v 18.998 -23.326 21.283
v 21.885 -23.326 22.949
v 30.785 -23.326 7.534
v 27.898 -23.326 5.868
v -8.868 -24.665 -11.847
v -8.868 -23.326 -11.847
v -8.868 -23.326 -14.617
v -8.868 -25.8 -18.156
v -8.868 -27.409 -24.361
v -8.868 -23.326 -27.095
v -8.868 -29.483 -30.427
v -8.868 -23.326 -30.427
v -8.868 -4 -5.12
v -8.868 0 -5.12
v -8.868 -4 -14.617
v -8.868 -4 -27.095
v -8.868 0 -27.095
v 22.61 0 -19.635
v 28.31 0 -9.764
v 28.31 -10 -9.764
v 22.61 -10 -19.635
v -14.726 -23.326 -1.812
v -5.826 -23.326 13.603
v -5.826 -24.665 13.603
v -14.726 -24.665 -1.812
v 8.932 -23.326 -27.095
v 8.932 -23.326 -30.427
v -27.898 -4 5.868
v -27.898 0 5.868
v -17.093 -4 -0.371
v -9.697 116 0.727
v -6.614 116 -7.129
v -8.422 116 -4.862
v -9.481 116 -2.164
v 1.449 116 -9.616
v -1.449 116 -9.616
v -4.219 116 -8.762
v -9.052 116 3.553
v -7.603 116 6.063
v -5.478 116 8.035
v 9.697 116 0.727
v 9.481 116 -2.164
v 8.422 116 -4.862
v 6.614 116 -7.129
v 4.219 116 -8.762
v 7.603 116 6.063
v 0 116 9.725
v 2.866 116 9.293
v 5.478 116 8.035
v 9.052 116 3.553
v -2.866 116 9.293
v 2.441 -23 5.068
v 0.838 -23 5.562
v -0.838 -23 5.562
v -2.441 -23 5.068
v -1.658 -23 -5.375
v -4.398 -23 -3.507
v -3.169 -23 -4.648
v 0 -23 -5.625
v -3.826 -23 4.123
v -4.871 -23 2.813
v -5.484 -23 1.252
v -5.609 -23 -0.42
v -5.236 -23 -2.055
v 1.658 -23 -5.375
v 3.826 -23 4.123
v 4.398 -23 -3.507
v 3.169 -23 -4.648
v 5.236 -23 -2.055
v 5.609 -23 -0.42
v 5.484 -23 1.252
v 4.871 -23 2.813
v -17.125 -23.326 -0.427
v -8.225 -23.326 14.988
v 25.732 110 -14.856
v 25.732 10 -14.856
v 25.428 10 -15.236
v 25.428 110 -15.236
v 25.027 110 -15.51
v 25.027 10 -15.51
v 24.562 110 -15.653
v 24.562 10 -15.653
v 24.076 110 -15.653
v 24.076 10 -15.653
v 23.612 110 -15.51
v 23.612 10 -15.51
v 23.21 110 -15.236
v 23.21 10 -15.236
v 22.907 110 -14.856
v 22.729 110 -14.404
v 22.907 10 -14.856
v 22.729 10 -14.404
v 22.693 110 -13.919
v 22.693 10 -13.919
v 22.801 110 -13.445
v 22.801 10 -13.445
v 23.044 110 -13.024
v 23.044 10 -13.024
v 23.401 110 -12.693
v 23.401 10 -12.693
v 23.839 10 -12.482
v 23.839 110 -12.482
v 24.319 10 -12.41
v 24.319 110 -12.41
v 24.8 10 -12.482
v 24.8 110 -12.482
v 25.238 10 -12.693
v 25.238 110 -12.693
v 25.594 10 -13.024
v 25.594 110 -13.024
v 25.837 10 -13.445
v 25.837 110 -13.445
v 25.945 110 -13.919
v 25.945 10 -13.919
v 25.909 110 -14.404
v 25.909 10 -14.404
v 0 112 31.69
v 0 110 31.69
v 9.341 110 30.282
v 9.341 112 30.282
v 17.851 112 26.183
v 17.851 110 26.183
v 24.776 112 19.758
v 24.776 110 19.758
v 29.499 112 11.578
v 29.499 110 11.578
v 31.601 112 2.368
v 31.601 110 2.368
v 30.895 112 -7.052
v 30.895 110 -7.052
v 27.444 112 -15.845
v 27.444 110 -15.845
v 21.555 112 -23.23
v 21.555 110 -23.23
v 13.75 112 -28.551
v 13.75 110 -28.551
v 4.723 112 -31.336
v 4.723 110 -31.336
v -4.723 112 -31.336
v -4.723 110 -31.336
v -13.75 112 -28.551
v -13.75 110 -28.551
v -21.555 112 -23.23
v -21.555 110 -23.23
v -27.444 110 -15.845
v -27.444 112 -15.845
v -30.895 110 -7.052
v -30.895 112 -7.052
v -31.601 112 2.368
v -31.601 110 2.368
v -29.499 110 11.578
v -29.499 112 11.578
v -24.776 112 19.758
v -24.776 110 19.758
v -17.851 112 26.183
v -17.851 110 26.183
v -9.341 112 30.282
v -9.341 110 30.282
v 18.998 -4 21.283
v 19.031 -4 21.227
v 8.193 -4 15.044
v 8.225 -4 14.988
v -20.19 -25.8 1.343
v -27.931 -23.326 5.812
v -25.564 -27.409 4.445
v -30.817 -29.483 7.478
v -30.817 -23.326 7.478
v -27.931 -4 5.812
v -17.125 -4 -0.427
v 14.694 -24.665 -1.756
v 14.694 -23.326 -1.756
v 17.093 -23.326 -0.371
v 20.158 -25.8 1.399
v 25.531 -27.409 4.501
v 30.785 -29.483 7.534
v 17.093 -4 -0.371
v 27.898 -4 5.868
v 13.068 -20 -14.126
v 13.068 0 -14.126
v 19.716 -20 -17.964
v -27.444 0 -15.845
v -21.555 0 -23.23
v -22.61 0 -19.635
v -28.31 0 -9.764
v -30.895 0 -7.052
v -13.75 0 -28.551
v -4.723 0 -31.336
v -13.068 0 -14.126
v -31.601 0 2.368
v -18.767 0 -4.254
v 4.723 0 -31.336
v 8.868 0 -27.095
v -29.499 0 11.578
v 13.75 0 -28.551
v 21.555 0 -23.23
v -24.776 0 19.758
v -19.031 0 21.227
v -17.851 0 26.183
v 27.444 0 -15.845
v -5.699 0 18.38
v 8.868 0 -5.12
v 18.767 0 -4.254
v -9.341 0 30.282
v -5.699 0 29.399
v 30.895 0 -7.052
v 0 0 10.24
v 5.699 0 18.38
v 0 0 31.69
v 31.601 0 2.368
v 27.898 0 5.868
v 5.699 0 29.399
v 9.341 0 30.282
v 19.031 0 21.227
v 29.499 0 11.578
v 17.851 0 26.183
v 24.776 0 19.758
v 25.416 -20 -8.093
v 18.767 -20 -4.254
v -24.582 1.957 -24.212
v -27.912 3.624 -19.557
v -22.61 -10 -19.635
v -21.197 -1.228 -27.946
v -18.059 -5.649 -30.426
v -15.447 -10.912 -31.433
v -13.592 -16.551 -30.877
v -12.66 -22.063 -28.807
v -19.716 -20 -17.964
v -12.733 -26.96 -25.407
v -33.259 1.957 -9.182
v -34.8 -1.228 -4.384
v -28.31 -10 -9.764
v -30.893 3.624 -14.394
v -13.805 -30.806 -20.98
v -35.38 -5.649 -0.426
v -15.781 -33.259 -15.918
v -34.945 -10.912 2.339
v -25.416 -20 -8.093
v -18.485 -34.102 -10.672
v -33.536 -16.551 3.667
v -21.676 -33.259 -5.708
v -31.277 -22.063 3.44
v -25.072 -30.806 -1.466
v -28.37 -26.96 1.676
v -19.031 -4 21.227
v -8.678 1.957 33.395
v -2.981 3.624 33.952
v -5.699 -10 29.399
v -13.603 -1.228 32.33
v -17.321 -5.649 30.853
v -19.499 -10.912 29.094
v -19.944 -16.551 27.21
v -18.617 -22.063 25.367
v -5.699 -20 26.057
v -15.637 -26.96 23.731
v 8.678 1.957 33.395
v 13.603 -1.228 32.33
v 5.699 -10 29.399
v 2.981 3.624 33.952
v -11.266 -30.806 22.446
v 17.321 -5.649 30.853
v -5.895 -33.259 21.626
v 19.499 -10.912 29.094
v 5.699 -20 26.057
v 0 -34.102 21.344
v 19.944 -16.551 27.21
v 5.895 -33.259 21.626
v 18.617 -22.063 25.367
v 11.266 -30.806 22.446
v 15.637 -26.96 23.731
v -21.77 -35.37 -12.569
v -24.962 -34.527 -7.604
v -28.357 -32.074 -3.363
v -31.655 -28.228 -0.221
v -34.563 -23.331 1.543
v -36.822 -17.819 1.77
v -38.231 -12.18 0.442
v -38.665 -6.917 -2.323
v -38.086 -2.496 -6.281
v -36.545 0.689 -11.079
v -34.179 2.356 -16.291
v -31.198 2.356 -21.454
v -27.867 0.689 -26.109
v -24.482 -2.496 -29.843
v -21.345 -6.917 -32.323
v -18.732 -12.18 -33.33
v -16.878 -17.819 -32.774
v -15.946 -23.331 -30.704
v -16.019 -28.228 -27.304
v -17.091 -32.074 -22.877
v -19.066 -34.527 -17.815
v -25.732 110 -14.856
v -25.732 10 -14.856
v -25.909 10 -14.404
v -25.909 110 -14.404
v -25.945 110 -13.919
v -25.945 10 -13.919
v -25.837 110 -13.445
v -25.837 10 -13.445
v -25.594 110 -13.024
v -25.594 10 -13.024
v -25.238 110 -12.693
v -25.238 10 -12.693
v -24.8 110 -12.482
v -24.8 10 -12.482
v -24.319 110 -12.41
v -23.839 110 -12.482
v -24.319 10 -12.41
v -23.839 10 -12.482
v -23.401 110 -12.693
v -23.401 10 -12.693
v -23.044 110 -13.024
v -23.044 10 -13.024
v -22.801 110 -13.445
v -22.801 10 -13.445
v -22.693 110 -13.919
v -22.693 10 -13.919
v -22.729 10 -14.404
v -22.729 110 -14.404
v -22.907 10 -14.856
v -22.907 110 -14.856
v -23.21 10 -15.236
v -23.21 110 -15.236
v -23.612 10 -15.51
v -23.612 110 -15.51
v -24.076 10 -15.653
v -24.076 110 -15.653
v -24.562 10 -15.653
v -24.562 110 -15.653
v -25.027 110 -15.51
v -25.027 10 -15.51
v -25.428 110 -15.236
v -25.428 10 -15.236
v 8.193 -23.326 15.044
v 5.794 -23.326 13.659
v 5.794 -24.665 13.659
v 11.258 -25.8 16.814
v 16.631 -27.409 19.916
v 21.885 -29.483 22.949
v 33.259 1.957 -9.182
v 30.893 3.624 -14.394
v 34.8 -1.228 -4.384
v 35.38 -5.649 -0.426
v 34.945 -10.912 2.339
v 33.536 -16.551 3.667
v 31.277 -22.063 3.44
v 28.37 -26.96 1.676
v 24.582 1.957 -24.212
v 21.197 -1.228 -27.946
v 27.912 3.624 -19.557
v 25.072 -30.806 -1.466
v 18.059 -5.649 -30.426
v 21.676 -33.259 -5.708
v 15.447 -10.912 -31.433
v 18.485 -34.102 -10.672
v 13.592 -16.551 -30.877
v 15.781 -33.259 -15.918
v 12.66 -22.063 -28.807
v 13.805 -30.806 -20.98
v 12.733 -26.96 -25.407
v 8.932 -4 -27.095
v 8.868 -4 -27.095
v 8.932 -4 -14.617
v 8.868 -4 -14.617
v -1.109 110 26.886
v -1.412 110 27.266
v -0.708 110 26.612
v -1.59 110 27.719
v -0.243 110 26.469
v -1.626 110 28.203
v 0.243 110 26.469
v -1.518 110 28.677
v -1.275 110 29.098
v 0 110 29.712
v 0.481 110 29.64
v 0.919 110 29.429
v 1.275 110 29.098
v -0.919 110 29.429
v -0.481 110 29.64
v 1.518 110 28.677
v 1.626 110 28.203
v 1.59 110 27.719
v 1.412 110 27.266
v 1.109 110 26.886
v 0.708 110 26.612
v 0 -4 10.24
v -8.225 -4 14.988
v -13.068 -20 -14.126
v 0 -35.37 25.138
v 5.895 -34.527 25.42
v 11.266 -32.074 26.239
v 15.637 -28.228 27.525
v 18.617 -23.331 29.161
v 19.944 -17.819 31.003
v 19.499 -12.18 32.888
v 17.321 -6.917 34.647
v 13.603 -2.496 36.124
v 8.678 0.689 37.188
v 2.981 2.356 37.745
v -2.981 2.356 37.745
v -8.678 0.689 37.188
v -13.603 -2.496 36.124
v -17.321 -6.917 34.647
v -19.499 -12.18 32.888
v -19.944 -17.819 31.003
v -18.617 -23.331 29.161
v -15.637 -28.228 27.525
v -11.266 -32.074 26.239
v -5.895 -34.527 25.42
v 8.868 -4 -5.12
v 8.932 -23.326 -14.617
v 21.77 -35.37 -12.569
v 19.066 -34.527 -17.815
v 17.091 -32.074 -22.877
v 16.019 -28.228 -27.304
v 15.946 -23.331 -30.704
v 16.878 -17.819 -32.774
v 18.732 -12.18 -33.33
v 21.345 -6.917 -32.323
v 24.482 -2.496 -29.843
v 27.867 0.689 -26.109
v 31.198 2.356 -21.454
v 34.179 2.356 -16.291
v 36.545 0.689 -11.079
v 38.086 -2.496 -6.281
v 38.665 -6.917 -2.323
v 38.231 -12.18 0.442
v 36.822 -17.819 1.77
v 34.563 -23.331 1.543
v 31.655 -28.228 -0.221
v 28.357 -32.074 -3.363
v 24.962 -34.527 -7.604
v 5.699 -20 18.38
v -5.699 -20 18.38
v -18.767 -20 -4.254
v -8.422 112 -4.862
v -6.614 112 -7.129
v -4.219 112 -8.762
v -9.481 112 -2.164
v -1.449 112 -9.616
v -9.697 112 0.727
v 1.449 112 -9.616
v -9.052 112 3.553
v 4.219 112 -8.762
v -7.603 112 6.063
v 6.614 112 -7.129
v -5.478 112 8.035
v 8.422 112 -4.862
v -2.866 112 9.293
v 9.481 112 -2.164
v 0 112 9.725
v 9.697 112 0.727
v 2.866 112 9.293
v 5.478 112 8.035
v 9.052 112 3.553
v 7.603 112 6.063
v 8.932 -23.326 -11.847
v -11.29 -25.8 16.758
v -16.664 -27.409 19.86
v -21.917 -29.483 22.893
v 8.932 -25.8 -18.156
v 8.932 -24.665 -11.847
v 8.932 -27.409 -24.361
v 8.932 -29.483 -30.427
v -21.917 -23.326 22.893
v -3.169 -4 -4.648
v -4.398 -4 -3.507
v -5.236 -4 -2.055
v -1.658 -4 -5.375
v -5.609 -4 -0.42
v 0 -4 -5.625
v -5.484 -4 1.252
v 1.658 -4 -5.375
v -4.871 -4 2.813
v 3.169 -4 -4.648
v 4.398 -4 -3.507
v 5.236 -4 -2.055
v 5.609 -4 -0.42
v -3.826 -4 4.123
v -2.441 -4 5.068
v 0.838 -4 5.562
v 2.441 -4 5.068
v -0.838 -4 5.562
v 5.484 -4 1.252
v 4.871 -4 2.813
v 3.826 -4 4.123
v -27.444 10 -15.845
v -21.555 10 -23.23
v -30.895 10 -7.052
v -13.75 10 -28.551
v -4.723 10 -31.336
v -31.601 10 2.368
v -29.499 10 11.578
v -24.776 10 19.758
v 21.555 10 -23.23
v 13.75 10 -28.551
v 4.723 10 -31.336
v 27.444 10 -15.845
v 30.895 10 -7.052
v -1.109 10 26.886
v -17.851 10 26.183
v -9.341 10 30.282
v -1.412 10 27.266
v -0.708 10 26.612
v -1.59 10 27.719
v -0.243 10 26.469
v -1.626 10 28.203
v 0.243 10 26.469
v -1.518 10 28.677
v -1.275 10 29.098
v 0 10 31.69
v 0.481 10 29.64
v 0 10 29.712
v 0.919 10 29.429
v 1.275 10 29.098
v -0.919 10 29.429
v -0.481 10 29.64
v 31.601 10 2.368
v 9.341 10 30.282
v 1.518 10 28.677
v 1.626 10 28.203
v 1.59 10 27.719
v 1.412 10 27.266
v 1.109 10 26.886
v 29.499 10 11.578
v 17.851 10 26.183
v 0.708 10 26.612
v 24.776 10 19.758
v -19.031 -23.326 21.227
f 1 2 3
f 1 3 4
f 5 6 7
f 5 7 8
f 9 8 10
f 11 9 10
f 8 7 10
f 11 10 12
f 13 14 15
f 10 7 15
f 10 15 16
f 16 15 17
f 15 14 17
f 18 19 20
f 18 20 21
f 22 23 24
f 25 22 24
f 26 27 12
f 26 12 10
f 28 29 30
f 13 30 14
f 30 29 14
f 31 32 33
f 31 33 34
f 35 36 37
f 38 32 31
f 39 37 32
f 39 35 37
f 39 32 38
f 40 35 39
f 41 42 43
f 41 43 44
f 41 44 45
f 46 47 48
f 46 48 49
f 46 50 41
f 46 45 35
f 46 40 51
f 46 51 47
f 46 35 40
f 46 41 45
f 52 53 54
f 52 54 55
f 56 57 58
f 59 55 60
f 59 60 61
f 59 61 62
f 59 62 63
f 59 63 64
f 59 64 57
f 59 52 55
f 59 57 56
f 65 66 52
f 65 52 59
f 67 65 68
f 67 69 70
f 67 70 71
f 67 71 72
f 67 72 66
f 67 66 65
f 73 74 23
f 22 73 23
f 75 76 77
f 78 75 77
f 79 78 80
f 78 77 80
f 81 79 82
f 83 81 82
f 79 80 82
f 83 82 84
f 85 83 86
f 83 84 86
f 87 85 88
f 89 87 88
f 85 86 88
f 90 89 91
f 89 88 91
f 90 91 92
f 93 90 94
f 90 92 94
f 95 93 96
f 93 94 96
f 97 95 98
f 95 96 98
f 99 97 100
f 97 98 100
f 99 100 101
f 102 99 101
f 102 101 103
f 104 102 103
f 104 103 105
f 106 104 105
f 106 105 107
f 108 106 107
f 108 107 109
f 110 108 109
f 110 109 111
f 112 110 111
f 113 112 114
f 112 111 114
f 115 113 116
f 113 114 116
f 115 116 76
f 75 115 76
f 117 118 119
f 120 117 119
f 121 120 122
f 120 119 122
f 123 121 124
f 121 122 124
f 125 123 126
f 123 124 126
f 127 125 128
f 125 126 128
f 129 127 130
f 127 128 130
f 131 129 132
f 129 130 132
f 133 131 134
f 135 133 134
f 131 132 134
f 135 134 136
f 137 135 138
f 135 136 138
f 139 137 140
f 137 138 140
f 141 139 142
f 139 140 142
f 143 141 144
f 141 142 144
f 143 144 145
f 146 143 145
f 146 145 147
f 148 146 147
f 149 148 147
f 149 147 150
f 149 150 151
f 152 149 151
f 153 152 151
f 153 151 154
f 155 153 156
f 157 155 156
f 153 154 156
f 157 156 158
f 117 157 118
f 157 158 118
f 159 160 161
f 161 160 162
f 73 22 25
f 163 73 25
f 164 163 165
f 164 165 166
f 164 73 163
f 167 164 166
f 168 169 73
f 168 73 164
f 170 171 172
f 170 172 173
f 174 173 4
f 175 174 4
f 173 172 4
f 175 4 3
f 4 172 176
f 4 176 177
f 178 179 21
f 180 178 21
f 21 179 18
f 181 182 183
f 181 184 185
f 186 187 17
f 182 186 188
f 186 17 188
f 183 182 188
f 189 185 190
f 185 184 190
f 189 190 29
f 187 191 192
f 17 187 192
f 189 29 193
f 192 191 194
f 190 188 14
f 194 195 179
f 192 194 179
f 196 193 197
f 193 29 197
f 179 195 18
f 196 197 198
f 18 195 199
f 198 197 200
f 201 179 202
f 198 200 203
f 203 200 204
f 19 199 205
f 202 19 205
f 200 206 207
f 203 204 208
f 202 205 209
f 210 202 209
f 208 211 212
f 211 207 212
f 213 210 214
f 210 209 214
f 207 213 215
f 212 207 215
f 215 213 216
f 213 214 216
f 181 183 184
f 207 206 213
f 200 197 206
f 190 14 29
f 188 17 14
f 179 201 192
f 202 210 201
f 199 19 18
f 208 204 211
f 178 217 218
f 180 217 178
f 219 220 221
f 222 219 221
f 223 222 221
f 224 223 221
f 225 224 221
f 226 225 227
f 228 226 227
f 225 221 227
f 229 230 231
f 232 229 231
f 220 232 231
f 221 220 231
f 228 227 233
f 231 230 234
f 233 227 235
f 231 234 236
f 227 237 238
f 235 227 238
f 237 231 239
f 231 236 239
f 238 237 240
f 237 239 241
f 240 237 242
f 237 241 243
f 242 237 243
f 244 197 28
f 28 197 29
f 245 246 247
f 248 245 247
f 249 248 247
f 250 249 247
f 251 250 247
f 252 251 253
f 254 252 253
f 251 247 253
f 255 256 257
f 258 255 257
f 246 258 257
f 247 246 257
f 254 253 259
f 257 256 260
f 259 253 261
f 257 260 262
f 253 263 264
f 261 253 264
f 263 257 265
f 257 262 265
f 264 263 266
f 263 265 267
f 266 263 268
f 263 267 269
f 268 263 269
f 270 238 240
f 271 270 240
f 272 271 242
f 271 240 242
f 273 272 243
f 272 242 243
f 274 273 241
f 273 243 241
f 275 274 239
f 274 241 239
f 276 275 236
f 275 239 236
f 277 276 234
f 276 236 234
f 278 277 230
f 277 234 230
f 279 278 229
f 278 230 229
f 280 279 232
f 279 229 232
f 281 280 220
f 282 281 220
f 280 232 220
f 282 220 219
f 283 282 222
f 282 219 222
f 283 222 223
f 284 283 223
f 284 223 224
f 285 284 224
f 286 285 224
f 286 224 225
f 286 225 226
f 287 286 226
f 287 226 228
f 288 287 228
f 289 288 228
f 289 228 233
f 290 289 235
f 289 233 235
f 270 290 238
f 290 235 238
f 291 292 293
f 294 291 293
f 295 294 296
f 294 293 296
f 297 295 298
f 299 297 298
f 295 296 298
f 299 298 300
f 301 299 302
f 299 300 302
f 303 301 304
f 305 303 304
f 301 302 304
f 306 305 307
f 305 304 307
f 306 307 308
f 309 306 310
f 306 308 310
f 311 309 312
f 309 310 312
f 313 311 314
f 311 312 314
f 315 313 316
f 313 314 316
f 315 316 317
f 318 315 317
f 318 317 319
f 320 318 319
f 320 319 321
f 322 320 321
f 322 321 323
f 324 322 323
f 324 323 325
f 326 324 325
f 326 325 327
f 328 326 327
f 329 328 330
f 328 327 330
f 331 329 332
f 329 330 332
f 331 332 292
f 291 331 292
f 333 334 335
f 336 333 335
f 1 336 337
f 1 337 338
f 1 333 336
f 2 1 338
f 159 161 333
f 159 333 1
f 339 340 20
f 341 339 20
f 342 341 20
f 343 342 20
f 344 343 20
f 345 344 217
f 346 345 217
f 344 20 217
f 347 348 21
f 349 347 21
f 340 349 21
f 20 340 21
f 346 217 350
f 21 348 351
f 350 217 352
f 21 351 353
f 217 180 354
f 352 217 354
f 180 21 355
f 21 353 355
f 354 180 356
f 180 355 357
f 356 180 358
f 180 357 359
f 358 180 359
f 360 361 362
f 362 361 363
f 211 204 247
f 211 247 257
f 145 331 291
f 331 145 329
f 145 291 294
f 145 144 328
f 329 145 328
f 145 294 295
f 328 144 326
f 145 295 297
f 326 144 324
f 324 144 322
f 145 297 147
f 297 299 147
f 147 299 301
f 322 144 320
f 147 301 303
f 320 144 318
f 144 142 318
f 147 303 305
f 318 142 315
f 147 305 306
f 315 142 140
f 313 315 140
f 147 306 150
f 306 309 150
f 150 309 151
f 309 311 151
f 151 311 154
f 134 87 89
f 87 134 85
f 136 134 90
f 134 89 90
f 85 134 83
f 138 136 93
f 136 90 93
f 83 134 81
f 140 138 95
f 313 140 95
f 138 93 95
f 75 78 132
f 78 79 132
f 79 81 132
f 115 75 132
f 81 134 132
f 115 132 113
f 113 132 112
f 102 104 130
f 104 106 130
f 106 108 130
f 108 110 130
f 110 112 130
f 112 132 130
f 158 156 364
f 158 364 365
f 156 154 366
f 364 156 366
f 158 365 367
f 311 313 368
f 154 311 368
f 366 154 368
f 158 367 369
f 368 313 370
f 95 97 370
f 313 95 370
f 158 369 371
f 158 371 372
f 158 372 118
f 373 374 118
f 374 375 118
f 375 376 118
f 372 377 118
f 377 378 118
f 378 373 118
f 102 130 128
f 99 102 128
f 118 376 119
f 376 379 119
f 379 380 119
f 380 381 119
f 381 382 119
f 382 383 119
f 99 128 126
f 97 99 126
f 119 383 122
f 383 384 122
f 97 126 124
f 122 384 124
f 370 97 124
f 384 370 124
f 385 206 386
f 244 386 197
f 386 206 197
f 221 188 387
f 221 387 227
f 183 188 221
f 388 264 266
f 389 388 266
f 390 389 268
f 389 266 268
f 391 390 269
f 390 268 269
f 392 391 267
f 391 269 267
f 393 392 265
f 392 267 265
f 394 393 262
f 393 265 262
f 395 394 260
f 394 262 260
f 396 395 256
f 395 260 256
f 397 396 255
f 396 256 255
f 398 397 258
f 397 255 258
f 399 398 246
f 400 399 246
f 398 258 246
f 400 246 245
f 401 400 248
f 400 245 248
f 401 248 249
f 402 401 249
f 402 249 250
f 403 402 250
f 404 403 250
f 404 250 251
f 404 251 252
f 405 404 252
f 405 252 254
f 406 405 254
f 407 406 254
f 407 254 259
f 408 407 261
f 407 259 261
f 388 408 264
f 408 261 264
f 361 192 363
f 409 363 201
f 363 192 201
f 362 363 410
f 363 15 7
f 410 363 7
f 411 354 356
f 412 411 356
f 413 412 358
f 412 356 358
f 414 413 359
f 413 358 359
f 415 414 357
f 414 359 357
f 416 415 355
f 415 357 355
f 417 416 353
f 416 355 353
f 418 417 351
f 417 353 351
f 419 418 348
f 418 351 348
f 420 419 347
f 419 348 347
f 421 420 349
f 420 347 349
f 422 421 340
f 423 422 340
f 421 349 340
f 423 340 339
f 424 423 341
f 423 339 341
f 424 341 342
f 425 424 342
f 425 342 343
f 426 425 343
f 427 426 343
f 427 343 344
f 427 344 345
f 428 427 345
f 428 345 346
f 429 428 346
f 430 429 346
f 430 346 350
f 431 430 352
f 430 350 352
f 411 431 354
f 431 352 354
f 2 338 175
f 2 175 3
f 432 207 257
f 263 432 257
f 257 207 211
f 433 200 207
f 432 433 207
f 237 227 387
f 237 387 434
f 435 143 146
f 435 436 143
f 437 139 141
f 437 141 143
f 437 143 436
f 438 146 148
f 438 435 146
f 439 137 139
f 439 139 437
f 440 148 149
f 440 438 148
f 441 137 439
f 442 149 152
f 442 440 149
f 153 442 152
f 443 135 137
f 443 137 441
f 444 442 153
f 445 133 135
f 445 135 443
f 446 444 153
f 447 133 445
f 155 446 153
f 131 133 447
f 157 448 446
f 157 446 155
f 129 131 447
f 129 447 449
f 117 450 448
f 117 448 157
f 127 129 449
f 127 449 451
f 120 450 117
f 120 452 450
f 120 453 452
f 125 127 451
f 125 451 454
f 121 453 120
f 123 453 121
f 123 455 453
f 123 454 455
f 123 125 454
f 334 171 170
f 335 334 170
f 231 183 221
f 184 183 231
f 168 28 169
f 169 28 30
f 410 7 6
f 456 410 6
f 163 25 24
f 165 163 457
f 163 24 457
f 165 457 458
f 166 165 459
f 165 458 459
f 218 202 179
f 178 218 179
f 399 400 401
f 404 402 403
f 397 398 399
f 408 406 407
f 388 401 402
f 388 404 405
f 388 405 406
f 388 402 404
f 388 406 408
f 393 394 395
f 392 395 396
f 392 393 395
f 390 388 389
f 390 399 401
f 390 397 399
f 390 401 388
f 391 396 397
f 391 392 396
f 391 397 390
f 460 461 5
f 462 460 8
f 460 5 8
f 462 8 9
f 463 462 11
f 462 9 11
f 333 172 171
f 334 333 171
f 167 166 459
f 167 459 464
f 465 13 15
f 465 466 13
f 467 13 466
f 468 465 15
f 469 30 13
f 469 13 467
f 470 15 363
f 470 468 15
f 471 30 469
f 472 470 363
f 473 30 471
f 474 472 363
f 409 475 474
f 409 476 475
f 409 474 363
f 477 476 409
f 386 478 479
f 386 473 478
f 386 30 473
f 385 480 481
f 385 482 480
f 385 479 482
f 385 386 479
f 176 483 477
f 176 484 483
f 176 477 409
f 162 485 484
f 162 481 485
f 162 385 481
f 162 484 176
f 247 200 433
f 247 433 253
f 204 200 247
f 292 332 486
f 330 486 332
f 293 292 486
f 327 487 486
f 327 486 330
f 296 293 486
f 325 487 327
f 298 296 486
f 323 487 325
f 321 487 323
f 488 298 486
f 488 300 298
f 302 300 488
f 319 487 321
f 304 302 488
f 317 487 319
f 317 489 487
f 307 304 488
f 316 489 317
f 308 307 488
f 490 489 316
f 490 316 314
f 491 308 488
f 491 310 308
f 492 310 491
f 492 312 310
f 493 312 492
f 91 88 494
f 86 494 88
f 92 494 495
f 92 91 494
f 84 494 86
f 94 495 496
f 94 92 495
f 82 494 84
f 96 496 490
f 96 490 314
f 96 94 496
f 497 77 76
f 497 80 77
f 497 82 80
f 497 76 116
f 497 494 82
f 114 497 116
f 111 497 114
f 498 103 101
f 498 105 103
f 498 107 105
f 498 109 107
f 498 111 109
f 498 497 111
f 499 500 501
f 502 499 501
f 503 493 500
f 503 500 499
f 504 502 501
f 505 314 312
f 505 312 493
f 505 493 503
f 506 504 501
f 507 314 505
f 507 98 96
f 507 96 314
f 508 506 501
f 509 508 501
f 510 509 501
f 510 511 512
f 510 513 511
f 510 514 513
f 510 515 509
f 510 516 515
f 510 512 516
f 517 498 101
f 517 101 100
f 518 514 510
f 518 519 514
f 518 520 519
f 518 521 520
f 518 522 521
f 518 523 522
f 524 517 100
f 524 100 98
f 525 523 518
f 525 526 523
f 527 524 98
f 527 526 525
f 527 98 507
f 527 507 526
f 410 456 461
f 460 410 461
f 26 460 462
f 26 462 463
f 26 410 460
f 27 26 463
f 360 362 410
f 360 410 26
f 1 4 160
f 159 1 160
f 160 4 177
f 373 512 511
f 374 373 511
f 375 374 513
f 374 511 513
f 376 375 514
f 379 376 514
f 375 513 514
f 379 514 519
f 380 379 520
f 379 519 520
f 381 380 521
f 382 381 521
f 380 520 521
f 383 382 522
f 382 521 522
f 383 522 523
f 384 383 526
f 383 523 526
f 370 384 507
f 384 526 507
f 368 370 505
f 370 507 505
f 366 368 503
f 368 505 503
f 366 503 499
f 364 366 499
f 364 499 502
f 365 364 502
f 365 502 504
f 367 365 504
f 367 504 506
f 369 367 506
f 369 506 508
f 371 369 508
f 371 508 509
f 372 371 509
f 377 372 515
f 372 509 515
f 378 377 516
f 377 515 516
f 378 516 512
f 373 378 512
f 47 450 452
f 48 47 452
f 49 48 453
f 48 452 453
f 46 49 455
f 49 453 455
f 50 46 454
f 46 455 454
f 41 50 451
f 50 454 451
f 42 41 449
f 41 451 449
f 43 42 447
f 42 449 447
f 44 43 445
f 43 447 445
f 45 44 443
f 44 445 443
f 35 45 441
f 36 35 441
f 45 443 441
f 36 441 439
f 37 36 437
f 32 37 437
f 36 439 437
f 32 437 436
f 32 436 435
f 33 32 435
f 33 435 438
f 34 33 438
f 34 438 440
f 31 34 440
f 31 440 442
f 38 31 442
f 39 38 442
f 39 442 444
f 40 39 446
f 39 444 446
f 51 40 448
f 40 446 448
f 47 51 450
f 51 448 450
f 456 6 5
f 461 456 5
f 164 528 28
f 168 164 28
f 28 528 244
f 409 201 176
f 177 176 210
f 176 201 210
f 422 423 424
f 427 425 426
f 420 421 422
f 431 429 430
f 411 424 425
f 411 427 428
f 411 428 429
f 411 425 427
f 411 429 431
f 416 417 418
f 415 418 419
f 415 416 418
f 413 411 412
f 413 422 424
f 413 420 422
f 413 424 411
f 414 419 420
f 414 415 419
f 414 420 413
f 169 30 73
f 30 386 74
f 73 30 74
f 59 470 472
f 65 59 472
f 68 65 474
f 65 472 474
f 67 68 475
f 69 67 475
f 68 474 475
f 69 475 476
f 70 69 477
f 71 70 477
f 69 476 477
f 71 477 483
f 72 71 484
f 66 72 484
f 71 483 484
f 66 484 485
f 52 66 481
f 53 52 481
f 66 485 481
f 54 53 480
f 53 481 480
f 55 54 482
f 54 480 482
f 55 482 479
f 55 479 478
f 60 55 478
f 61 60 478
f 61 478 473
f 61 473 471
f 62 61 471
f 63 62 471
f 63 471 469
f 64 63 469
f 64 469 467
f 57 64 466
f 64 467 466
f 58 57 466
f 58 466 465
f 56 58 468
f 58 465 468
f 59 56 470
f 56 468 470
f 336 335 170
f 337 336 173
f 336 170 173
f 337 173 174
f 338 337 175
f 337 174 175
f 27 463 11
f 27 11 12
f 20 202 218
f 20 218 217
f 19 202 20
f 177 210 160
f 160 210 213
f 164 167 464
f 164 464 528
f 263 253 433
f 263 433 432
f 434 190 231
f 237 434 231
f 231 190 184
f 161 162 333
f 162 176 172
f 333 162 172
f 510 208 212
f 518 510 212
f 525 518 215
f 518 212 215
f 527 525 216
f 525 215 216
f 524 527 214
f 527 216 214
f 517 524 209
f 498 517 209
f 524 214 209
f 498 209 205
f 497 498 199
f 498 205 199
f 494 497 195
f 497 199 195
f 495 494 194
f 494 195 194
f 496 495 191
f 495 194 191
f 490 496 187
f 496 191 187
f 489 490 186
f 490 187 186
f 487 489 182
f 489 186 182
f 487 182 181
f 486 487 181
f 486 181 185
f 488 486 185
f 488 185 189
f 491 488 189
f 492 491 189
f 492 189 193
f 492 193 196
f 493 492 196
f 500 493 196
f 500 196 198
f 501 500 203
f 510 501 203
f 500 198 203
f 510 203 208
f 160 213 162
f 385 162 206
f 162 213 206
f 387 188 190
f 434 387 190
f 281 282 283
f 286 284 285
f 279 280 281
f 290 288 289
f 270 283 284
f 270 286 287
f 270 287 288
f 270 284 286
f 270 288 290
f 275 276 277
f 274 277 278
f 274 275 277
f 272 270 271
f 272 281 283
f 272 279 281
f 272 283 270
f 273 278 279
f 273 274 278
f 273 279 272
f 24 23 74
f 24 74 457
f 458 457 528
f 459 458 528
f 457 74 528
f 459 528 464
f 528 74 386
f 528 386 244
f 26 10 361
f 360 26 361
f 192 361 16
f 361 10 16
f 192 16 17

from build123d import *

# Parameters (mm, degrees)
SKETCH_2_R               = 31.689767185
EXTRUDE_1_DEPTH          = 10
SKETCH_3_W               = 11.398540158
SKETCH_3_H               = 11.018588819
EXTRUDE_2_DEPTH          = 20
CUT_EXTRUDE_1_DEPTH      = 20
SKETCH_6_R               = 20
EXTRUDE_3_DEPTH          = 4
PATTERN_CIRCULAR_2_COUNT = 3
EXTRUDE_4_DEPTH          = 4
EXTRUDE_5_DEPTH          = 17.8
PATTERN_CIRCULAR_3_COUNT = 3
SKETCH_9_R               = 5.625050713
EXTRUDE_6_DEPTH          = 19
SKETCH_10_R              = 1.630795406
EXTRUDE_7_DEPTH          = 100
PATTERN_CIRCULAR_4_COUNT = 3
SKETCH_11_R              = 31.689767185
EXTRUDE_8_DEPTH          = 2
SKETCH_12_R              = 9.724605512
EXTRUDE_9_DEPTH          = 4


with BuildPart() as part:
    # 草图2 → 凸台-拉伸1 (new body)
    with BuildSketch(Plane(origin=(0, 0, 0), x_dir=(1, 0, 0), z_dir=(0, 1, 0))):
        with Locations(Location((0, 0, 0), (0, 0, 270))):
            Circle(SKETCH_2_R)
    extrude(amount=EXTRUDE_1_DEPTH)

    # 草图3 → 凸台-拉伸2 (add)
    with BuildSketch(Plane.XZ):
        with Locations((0, 23.889440414)):
            Rectangle(SKETCH_3_W, SKETCH_3_H)
    extrude_2 = extrude(amount=EXTRUDE_2_DEPTH)

    # 草图4 → 切除-拉伸1 (cut)
    with BuildSketch(Plane(origin=(5.699270079, 0, 0), x_dir=(0, 0, -1), z_dir=(1, 0, 0))):
        Polygon((-29.398734823, -10), (-26.056890095, -20), (-29.398734823, -20), align=None)
    cut_extrude_1 = extrude(amount=-CUT_EXTRUDE_1_DEPTH, mode=Mode.SUBTRACT)

    # 草图6 → 凸台-拉伸3 (add)
    with BuildSketch(Plane(origin=(0, -9.842221306, 29.451462012), x_dir=(1, 0, 0), z_dir=(0, -0.316954203171244, 0.9484408432222232))):
        with Locations(Location((0, -5.578767415, 0), (0, 0, 270))):
            Circle(SKETCH_6_R)
    extrude_3 = extrude(amount=EXTRUDE_3_DEPTH)

    # 阵列(圆周)2: 凸台-拉伸2, 切除-拉伸1, 凸台-拉伸3 ×3 about axis
    pattern_circular_2_axis = Axis((0, 0, 0), (0, 1, 0))
    add([extrude_2.rotate(pattern_circular_2_axis, i * 360 / PATTERN_CIRCULAR_2_COUNT) for i in range(1, PATTERN_CIRCULAR_2_COUNT)])
    add([cut_extrude_1.rotate(pattern_circular_2_axis, i * 360 / PATTERN_CIRCULAR_2_COUNT) for i in range(1, PATTERN_CIRCULAR_2_COUNT)], mode=Mode.SUBTRACT)
    add([extrude_3.rotate(pattern_circular_2_axis, i * 360 / PATTERN_CIRCULAR_2_COUNT) for i in range(1, PATTERN_CIRCULAR_2_COUNT)])

    # 草图7 → 凸台-拉伸4 (add)
    with BuildSketch(Plane.XZ):
        with BuildLine():
            Line((-4.433868769, 7.679685983), (0, 10.23958131))
            Line((0, 10.23958131), (-19.030711532, 21.226967736))
            Line((-19.030711532, 21.226967736), (-27.898449071, 5.86759577))
            Line((-27.898449071, 5.86759577), (-8.867737539, -5.119790655))
            Line((-8.867737539, -5.119790655), (-8.867737539, 0))
            ThreePointArc((-8.867737539, 0), (-7.679685983, 4.433868769), (-4.433868769, 7.679685983))
        make_face()
        with BuildLine():
            ThreePointArc((4.433868769, 7.679685983), (7.679685983, 4.433868769), (8.867737539, 0))
            Line((8.867737539, 0), (8.867737539, -5.119790655))
            Line((8.867737539, -5.119790655), (27.898449071, 5.86759577))
            Line((27.898449071, 5.86759577), (19.030711532, 21.226967736))
            Line((19.030711532, 21.226967736), (0, 10.23958131))
            Line((0, 10.23958131), (4.433868769, 7.679685983))
        make_face()
        with BuildLine():
            Line((8.867737539, -27.094563507), (8.867737539, -5.119790655))
            Line((8.867737539, -5.119790655), (4.433868769, -7.679685983))
            ThreePointArc((4.433868769, -7.679685983), (0, -8.867737539), (-4.433868769, -7.679685983))
            Line((-4.433868769, -7.679685983), (-8.867737539, -5.119790655))
            Line((-8.867737539, -5.119790655), (-8.867737539, -27.094563507))
            Line((-8.867737539, -27.094563507), (8.867737539, -27.094563507))
        make_face()
        with BuildLine():
            ThreePointArc((4.433868769, -7.679685983), (7.679685983, -4.433868769), (8.867737539, 0))
            ThreePointArc((8.867737539, 0), (7.679685983, 4.433868769), (4.433868769, 7.679685983))
            ThreePointArc((4.433868769, 7.679685983), (0, 8.867737539), (-4.433868769, 7.679685983))
            ThreePointArc((-4.433868769, 7.679685983), (-7.679685983, 4.433868769), (-8.867737539, 0))
            ThreePointArc((-8.867737539, 0), (-7.679685983, -4.433868769), (-4.433868769, -7.679685983))
            ThreePointArc((-4.433868769, -7.679685983), (0, -8.867737539), (4.433868769, -7.679685983))
        make_face()
        with BuildLine():
            Line((8.867737539, -5.119790655), (8.867737539, 0))
            ThreePointArc((8.867737539, 0), (7.679685983, -4.433868769), (4.433868769, -7.679685983))
            Line((4.433868769, -7.679685983), (8.867737539, -5.119790655))
        make_face()
        with BuildLine():
            Line((-8.867737539, -5.119790655), (-4.433868769, -7.679685983))
            ThreePointArc((-4.433868769, -7.679685983), (-7.679685983, -4.433868769), (-8.867737539, 0))
            Line((-8.867737539, 0), (-8.867737539, -5.119790655))
        make_face()
        with BuildLine():
            ThreePointArc((-4.433868769, 7.679685983), (0, 8.867737539), (4.433868769, 7.679685983))
            Line((4.433868769, 7.679685983), (0, 10.23958131))
            Line((0, 10.23958131), (-4.433868769, 7.679685983))
        make_face()
    extrude(amount=EXTRUDE_4_DEPTH)

    # 草图8 → 凸台-拉伸5 (add)
    with BuildSketch(Plane(origin=(4.433868769, 0, -7.679685983), x_dir=(-0.8660254037844431, 0, -0.499999999999992), z_dir=(0.49999999999999206, 0, -0.8660254037844433))):
        with BuildLine():
            Line((-30.427113752, -29.482756554), (-30.427113752, -23.325905307))
            Line((-30.427113752, -23.325905307), (-27.094563507, -23.325905307))
            Line((-27.094563507, -23.325905307), (-27.094563507, -4))
            Line((-27.094563507, -4), (-14.617014317, -4))
            Line((-14.617014317, -4), (-14.617014317, -23.325905307))
            Line((-14.617014317, -23.325905307), (-11.847477178, -23.325905307))
            Line((-11.847477178, -23.325905307), (-11.847477178, -24.665032542))
            ThreePointArc((-11.847477178, -24.665032542), (-21.274112807, -26.546256084), (-30.427113752, -29.482756554))
        make_face()
    extrude_5 = extrude(amount=-EXTRUDE_5_DEPTH)

    # 阵列(圆周)3: 凸台-拉伸5 ×3 about axis
    pattern_circular_3_axis = Axis((0, 0, 0), (0, 1, 0))
    for i in range(1, PATTERN_CIRCULAR_3_COUNT):
        add(extrude_5.rotate(pattern_circular_3_axis, i * 360 / PATTERN_CIRCULAR_3_COUNT))

    # 草图9 → 凸台-拉伸6 (add)
    with BuildSketch(Plane.XZ.offset(4)):
        with Locations(Location((0, 0, 0), (0, 0, 270))):
            Circle(SKETCH_9_R)
    extrude(amount=EXTRUDE_6_DEPTH)

    # 草图10 → 凸台-拉伸7 (add)
    with BuildSketch(Plane(origin=(0, 10, 0), x_dir=(1, 0, 0), z_dir=(0, 1, 0))):
        with Locations(Location((0, -28.081418828, 0), (0, 0, 270))):
            Circle(SKETCH_10_R)
    extrude_7 = extrude(amount=EXTRUDE_7_DEPTH)

    # 阵列(圆周)4: 凸台-拉伸7 ×3 about axis
    pattern_circular_4_axis = Axis((0, 0, 0), (0, 1, 0))
    for i in range(1, PATTERN_CIRCULAR_4_COUNT):
        add(extrude_7.rotate(pattern_circular_4_axis, i * 360 / PATTERN_CIRCULAR_4_COUNT))

    # 草图11 → 凸台-拉伸8 (add)
    with BuildSketch(Plane(origin=(0, 110, 0), x_dir=(1, 0, 0), z_dir=(0, 1, 0))):
        with Locations(Location((0, 0, 0), (0, 0, 270))):
            Circle(SKETCH_11_R)
    extrude(amount=EXTRUDE_8_DEPTH)

    # 草图12 → 凸台-拉伸9 (add)
    with BuildSketch(Plane(origin=(0, 112, 0), x_dir=(1, 0, 0), z_dir=(0, 1, 0))):
        with Locations(Location((0, 0, 0), (0, 0, 270))):
            Circle(SKETCH_12_R)
    extrude(amount=EXTRUDE_9_DEPTH)


solid = part.part
